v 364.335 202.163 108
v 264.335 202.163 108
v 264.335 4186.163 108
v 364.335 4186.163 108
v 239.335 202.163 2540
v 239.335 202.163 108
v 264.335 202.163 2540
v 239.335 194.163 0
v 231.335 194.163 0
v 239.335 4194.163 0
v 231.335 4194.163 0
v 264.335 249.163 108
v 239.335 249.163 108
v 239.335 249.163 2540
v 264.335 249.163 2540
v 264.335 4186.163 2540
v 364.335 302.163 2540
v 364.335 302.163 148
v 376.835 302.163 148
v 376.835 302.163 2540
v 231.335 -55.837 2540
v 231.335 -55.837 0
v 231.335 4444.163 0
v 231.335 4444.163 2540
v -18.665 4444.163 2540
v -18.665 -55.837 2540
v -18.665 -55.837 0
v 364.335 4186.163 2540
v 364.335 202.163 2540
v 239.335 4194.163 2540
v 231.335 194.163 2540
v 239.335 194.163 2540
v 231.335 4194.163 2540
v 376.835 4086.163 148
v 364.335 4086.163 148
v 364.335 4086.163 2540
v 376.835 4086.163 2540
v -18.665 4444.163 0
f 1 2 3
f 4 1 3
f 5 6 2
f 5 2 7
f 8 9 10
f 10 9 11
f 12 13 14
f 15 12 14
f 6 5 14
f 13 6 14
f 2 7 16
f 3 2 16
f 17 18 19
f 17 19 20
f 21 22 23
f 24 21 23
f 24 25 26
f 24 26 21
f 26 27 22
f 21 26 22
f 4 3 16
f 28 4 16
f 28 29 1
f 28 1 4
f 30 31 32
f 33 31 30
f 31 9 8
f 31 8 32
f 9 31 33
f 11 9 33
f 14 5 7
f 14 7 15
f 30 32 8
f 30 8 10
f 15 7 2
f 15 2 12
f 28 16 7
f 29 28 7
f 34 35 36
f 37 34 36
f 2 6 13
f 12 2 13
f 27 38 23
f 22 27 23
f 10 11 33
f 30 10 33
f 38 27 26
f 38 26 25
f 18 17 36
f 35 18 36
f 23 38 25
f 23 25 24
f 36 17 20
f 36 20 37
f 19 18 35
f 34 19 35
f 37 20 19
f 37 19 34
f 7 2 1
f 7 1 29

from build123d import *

# Parameters (mm, degrees)
F0_W     = 250
F0_H     = 4500
F1_DEPTH = 2540
F2_W     = 4000
F2_H     = 2540
F3_DEPTH = 8
F4_W     = 47
F4_H     = 2432
F5_DEPTH = 25
F6_W     = 47
F6_H     = 2432
F6_W_2   = 3937
F7_DEPTH = 100
F8_W     = 3784
F8_H     = 2392
F9_DEPTH = 12.5


with BuildPart() as f1:
    # F0 (on Top) → F1 (new body)
    with BuildSketch(Plane.XY):
        with Locations((106.335197, 2194.162607)):
            Rectangle(F0_W, F0_H)
    extrude(amount=F1_DEPTH)


with BuildPart() as f3:
    # F2 (on face) → F3 (new body)
    with BuildSketch(Plane.YZ.offset(231.335197)):
        with Locations((2194.162607, 1270)):
            Rectangle(F2_W, F2_H)
    extrude(amount=F3_DEPTH)


with BuildPart() as f5:
    # F4 (on face) → F5 (new body)
    with BuildSketch(Plane.YZ.offset(239.335197)):
        with Locations((225.662607, 1324)):
            Rectangle(F4_W, F4_H)
    extrude(amount=F5_DEPTH)


with BuildPart() as f7:
    # F6 (on face) → F7 (new body)
    with BuildSketch(Plane.YZ.offset(264.335197)):
        with Locations((225.662607, 1324)):
            Rectangle(F6_W, F6_H)
        with Locations((2217.662607, 1324)):
            Rectangle(F6_W_2, F6_H)
    extrude(amount=F7_DEPTH)


with BuildPart() as f9:
    # F8 (on face) → F9 (new body)
    with BuildSketch(Plane.YZ.offset(364.335197)):
        with Locations((2194.162607, 1344)):
            Rectangle(F8_W, F8_H)
    extrude(amount=F9_DEPTH)


solid = Compound([f1.part, f3.part, f5.part, f7.part, f9.part])
